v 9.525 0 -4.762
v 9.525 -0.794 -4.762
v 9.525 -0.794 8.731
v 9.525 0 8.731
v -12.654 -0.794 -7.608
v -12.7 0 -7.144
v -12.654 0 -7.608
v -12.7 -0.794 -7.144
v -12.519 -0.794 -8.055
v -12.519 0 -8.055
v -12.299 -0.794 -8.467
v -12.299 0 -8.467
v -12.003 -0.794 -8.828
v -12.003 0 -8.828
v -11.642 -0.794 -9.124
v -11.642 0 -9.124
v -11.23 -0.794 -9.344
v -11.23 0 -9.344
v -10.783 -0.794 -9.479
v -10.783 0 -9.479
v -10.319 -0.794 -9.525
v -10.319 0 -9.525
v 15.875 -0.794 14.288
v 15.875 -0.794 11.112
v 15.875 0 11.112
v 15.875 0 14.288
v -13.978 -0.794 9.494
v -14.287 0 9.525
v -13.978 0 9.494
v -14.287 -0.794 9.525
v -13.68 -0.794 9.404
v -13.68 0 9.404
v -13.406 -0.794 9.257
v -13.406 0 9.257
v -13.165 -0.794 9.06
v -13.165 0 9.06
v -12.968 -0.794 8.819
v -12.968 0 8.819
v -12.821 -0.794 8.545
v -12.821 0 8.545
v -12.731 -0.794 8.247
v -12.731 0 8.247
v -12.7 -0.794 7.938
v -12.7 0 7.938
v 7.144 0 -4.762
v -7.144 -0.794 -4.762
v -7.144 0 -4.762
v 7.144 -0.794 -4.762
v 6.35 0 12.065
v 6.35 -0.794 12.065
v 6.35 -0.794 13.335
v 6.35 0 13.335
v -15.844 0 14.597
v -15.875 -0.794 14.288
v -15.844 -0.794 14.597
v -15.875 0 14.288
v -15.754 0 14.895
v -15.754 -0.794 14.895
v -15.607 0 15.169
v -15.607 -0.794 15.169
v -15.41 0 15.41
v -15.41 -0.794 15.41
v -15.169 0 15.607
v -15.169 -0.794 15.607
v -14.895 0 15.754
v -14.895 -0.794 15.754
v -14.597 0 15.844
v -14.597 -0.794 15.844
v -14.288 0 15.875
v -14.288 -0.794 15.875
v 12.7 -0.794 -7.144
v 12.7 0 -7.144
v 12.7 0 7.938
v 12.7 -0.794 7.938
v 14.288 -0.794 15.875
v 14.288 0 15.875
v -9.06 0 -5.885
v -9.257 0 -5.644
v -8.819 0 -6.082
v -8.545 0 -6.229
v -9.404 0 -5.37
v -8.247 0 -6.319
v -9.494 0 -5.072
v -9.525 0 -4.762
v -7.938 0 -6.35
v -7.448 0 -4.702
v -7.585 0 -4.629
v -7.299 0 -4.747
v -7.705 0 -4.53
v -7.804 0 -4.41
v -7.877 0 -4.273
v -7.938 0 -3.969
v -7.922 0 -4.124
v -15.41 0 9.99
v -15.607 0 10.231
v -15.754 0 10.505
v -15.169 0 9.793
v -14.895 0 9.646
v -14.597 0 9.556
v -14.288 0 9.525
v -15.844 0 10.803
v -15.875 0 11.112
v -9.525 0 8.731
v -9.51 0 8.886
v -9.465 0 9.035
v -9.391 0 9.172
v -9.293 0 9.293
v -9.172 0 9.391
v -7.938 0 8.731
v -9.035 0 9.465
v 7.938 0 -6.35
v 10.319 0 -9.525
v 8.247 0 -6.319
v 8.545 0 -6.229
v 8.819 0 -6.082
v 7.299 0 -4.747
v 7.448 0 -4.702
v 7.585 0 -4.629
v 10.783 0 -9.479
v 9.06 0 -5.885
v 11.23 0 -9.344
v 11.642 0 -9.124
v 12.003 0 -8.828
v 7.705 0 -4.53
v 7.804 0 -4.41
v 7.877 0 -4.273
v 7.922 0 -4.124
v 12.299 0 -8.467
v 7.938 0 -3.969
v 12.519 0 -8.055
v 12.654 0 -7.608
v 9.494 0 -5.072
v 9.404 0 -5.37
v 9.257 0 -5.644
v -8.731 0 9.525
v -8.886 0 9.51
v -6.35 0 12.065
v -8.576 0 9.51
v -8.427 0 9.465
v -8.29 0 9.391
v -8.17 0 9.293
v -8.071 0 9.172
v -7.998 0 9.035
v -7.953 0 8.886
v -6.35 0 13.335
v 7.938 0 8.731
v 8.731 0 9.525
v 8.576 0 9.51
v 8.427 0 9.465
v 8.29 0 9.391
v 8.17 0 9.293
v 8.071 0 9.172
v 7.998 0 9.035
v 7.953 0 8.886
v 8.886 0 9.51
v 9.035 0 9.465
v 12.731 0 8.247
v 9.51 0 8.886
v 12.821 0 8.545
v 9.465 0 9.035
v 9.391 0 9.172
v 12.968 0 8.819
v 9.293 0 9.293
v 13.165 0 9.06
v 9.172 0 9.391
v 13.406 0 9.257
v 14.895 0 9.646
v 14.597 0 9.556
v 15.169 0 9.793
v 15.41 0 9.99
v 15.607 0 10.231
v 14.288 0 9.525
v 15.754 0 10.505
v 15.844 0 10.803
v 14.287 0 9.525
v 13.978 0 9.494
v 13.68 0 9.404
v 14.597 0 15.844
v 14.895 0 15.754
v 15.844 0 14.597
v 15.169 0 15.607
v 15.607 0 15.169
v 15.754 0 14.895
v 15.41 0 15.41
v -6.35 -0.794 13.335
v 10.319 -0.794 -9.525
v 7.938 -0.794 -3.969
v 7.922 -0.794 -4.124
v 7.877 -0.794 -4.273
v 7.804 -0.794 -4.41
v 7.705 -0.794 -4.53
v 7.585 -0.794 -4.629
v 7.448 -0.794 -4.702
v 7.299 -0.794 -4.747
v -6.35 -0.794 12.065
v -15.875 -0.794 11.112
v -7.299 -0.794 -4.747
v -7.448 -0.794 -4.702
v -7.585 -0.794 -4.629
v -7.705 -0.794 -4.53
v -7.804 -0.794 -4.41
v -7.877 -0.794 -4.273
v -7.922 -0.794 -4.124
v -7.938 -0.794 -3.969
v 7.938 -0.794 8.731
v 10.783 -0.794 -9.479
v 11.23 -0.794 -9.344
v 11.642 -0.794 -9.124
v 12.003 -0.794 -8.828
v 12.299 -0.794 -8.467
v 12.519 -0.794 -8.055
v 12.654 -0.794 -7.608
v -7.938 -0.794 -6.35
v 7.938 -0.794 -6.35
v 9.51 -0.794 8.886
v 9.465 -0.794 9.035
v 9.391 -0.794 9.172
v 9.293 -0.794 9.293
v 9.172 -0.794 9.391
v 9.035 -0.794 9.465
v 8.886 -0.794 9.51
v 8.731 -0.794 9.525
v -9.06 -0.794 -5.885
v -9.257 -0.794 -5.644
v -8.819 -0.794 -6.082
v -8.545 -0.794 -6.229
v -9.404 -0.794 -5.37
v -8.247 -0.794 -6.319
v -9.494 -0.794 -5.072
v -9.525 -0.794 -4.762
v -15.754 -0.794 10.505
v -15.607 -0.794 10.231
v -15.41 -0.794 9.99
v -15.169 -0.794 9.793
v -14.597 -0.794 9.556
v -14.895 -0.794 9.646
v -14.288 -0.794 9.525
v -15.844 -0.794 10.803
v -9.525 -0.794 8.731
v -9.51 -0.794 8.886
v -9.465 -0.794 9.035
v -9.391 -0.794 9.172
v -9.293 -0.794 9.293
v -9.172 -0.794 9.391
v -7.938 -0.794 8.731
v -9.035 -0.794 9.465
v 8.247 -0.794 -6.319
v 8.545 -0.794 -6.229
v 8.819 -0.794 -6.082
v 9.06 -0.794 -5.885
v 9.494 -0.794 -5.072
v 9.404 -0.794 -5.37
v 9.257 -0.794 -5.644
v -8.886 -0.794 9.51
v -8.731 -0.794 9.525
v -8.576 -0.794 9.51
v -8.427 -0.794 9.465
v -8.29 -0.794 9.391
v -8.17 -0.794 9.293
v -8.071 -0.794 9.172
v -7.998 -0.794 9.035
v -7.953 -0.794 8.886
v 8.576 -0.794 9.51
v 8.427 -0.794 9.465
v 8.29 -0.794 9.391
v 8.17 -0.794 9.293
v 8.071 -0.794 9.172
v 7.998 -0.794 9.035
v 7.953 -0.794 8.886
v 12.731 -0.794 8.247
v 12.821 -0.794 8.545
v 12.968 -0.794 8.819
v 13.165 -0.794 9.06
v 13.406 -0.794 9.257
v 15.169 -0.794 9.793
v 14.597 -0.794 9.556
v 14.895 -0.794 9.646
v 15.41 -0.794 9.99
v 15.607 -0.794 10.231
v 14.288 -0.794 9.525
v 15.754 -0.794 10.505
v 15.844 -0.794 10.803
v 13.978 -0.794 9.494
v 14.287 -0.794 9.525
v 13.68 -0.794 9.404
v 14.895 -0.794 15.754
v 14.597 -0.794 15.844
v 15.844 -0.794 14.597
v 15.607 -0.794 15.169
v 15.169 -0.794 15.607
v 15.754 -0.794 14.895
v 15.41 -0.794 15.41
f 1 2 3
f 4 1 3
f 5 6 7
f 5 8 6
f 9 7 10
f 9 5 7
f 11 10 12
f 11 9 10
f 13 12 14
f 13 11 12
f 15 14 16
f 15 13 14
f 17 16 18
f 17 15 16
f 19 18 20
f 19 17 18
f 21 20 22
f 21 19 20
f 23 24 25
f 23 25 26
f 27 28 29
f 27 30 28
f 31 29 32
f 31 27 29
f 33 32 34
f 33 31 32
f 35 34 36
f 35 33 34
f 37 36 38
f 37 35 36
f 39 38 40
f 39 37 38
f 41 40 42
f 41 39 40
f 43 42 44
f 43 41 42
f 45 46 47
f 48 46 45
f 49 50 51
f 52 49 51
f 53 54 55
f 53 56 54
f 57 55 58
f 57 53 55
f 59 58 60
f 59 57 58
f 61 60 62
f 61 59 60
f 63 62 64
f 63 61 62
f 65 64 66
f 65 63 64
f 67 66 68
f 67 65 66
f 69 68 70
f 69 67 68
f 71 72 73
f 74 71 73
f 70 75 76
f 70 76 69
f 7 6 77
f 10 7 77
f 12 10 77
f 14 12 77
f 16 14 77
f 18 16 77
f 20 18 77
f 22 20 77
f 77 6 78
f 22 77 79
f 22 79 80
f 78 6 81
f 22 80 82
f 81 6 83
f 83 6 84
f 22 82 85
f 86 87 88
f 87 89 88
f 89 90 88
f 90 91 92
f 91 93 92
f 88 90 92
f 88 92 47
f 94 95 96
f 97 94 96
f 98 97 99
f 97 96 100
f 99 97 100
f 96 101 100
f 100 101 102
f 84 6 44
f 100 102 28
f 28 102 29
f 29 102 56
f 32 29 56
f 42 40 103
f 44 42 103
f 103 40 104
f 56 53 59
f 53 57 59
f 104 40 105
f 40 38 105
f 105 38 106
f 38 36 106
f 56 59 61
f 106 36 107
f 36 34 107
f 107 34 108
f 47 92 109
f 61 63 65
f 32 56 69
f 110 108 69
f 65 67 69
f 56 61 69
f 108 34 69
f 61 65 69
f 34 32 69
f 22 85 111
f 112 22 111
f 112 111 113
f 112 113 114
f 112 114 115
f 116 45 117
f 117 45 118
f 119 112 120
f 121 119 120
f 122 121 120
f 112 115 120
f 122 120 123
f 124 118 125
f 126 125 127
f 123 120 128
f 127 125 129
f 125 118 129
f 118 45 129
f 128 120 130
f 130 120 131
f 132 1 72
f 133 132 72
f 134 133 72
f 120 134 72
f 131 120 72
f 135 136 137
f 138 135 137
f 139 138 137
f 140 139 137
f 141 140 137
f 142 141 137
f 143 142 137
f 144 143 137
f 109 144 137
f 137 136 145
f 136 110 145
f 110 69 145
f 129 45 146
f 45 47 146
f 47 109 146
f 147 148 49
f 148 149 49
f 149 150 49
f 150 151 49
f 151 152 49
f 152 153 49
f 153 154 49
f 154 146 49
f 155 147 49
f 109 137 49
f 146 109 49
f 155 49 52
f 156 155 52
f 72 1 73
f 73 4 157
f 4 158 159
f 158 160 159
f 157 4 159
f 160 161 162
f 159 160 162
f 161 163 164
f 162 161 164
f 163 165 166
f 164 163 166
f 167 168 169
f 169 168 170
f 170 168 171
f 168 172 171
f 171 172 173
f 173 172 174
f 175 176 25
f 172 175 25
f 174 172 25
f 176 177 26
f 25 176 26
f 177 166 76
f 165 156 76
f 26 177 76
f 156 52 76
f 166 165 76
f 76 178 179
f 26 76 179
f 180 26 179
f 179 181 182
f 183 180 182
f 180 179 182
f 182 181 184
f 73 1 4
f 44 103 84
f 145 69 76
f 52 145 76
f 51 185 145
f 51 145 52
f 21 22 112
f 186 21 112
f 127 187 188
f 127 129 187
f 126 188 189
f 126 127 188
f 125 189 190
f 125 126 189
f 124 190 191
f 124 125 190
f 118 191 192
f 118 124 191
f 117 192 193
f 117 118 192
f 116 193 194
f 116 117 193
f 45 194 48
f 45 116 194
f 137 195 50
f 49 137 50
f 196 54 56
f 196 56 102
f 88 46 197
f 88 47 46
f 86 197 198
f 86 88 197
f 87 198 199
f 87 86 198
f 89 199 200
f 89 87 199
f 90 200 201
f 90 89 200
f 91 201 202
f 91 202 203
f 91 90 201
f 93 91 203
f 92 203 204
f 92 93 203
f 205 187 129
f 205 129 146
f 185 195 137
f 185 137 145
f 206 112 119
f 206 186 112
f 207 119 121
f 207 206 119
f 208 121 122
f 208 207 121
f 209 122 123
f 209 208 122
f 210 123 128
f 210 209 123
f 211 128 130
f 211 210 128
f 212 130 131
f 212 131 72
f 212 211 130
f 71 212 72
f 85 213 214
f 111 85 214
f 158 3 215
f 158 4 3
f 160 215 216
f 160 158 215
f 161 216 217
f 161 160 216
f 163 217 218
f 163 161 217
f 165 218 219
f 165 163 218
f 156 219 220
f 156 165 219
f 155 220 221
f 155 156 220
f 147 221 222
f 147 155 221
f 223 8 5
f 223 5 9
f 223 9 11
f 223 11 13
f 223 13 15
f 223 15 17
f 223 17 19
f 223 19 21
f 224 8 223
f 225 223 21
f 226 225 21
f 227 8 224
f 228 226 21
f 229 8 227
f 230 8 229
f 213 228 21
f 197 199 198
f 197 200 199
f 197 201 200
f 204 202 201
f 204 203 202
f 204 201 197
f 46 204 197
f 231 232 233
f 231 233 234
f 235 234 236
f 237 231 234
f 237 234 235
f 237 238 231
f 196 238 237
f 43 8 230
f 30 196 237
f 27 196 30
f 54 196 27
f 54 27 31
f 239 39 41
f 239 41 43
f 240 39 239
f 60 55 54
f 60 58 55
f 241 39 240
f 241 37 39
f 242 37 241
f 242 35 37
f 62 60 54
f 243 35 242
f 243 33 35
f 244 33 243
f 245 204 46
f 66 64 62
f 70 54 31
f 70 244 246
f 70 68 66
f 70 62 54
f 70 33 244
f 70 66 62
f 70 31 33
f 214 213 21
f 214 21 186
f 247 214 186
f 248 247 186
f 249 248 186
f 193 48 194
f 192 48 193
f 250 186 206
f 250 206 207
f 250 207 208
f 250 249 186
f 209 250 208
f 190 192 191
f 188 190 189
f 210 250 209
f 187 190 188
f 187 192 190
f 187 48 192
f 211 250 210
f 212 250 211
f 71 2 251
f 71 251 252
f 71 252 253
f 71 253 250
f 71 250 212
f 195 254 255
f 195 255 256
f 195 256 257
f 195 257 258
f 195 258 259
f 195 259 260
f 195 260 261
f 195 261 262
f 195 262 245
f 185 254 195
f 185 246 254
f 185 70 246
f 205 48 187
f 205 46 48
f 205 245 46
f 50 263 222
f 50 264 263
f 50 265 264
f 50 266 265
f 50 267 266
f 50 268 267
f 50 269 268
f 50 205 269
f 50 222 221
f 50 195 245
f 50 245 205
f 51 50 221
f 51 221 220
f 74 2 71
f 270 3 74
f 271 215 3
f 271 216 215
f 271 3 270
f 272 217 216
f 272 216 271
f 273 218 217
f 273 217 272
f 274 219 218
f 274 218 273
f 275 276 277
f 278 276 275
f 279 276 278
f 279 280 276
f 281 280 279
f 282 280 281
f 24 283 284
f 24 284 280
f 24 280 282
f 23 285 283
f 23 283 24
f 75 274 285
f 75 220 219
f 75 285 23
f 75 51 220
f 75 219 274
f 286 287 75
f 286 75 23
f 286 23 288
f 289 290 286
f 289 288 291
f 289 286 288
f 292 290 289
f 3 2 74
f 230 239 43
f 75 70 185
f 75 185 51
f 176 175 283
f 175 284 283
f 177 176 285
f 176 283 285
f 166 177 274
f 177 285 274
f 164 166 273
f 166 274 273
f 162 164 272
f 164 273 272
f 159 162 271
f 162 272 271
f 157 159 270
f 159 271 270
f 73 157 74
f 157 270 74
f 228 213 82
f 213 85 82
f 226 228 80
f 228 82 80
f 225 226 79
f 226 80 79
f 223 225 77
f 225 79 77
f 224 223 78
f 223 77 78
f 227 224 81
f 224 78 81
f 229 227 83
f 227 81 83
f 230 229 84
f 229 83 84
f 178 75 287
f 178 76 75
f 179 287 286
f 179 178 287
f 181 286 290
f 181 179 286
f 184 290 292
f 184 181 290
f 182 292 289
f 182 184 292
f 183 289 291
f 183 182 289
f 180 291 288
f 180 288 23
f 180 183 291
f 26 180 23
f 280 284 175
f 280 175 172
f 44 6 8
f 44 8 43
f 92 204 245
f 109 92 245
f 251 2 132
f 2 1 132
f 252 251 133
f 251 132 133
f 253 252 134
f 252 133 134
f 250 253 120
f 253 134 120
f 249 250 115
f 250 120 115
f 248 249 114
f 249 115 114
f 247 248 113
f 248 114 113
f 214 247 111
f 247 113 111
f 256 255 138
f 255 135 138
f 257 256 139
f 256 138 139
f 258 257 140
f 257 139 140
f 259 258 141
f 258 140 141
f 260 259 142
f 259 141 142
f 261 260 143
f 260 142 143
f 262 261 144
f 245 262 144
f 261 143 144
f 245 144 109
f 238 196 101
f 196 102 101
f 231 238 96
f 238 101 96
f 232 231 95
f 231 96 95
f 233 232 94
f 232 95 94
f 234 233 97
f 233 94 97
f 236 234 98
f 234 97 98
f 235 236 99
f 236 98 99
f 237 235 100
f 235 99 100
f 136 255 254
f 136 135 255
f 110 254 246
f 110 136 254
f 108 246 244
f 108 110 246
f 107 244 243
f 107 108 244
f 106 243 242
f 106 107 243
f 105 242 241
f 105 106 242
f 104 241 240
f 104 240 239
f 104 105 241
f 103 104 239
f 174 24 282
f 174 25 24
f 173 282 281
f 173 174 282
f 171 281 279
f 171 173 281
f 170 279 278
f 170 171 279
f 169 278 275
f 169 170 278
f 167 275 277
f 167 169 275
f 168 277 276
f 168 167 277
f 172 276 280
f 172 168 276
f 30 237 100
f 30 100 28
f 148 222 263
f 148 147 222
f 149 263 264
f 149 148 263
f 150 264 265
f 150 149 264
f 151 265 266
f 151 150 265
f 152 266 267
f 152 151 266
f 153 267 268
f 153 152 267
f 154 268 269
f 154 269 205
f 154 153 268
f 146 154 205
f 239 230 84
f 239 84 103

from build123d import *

# Parameters (mm, degrees)
F0_W      = 25.4
F0_H      = 19.05
F1_DEPTH  = 0.79375
F2_R      = 2.38125
F3_W      = 19.05
F3_H      = 15.875
F4_DEPTH  = 4.9276
F5_W      = 12.7
F5_H      = 1.27
F6_DEPTH  = 0.79375
F7_R      = 1.58749
F8_R      = 1.5875
F9_W      = 12.7
F9_H      = 1.27
F9_W_2    = 15.875
F9_H_2    = 14.2875
F10_DEPTH = 0.79375
F11_R     = 0.79374
F12_R     = 0.79375


# Not quite as in the source:
# - a fillet or chamfer is up to 0.001 mm smaller than in the source, because OpenCascade refuses the exact size
# - ends of sketch curves that miss each other by under 0.0002 mm in the source are joined


with BuildPart() as f1:
    # F0 (on Front) → F1 (new body)
    with BuildSketch(Plane.XZ):
        Rectangle(F0_W, F0_H)
    extrude(amount=F1_DEPTH)

    # F2
    f2_edges = [f1.edges().sort_by_distance(p)[0] for p in [
        (12.7, -0.396875, -9.525),
        (-12.7, -0.396875, -9.525),
    ]]
    fillet(f2_edges, radius=F2_R)

    # F3 (on face) → F4 (cut)
    with BuildSketch(Plane.XZ.offset(0.79375)):
        with Locations((0, 1.5875)):
            Rectangle(F3_W, F3_H)
    extrude(amount=-F4_DEPTH, mode=Mode.SUBTRACT)

    # F5 (on face) → F6 (join)
    with BuildSketch(Plane.XZ.offset(0.79375)):
        Polygon((-15.875, 15.875), (-15.875, 9.525), (-12.7, 9.525), (-9.525, 9.525), (9.525, 9.525), (12.7, 9.525), (15.875, 9.525), (15.875, 15.875), align=None)
        with Locations((0, 12.7)):
            Rectangle(F5_W, F5_H, mode=Mode.SUBTRACT)
    extrude(amount=-F6_DEPTH)

    # F7 (radius 1.5875 in the source; OpenCascade refuses exactly that, so slightly less here)
    f7_edges = [f1.edges().sort_by_distance(p)[0] for p in [
        (-15.875, -0.396875, 15.875),
        (15.875, -0.396875, 15.875),
        (15.875, -0.396875, 9.525),
        (12.7, -0.396875, 9.525),
        (-15.875, -0.396875, 9.525),
        (-12.7, -0.396875, 9.525),
    ]]
    fillet(f7_edges, radius=F7_R)

    # F8
    f8_edges = [f1.edges().sort_by_distance(p)[0] for p in [
        (-9.525, -0.396875, -6.35),
        (9.525, -0.396875, -6.35),
    ]]
    fillet(f8_edges, radius=F8_R)

    # F9 (on face) → F10 (join)
    with BuildSketch(Plane.XZ.offset(0.79375)):
        with BuildLine():
            ThreePointArc((-14.28751, 15.875), (-15.4100349441, 15.4100349441), (-15.875, 14.28751))
            Line((-15.875, 14.28751), (-15.875, 11.11249))
            ThreePointArc((-15.875, 11.11249), (-15.4100349441, 9.9899650559), (-14.28751, 9.525))
            ThreePointArc((-14.28751, 9.525), (-13.1649650559, 9.0600349441), (-12.7, 7.93751))
            Line((-12.7, 7.93751), (-12.7, -7.14375))
            ThreePointArc((-12.7, -7.14375), (-12.0025480227, -8.8275480227), (-10.31875, -9.525))
            Line((-10.31875, -9.525), (10.31875, -9.525))
            ThreePointArc((10.31875, -9.525), (12.0025480227, -8.8275480227), (12.7, -7.14375))
            Line((12.7, -7.14375), (12.7, 7.93751))
            ThreePointArc((12.7, 7.93751), (13.1649650559, 9.0600349441), (14.28749, 9.525))
            ThreePointArc((14.28749, 9.525), (15.4100349441, 9.9899650559), (15.875, 11.11249))
            Line((15.875, 11.11249), (15.875, 14.28751))
            ThreePointArc((15.875, 14.28751), (15.4100349441, 15.4100349441), (14.28751, 15.875))
            Line((14.28751, 15.875), (-14.28751, 15.875))
        make_face()
        with BuildLine():
            Line((-9.525, 9.525), (-7.9375, 9.525))
            Line((-7.9375, 9.525), (7.9375, 9.525))
            Line((7.9375, 9.525), (9.525, 9.525))
            Line((9.525, 9.525), (9.525, -4.7625))
            ThreePointArc((9.525, -4.7625), (9.0600320151, -5.8850320151), (7.9375, -6.35))
            Line((7.9375, -6.35), (-7.9375, -6.35))
            ThreePointArc((-7.9375, -6.35), (-9.0600320151, -5.8850320151), (-9.525, -4.7625))
            Line((-9.525, -4.7625), (-9.525, 9.525))
        make_face(mode=Mode.SUBTRACT)
        with Locations((0, 12.7)):
            Rectangle(F9_W, F9_H, mode=Mode.SUBTRACT)
        with Locations((0, 2.38125)):
            Rectangle(F9_W_2, F9_H_2)
    extrude(amount=-F10_DEPTH)

    # F11 (radius 0.79375 in the source; OpenCascade refuses exactly that, so slightly less here)
    f11_edges = [f1.edges().sort_by_distance(p)[0] for p in [
        (-7.9375, -0.396875, 9.525),
        (-9.525, -0.396875, 9.525),
        (7.9375, -0.396875, 9.525),
        (9.525, -0.396875, 9.525),
    ]]
    fillet(f11_edges, radius=F11_R)

    # F12
    f12_edges = [f1.edges().sort_by_distance(p)[0] for p in [
        (-7.9375, -0.396875, -4.7625),
        (7.9375, -0.396875, -4.7625),
    ]]
    fillet(f12_edges, radius=F12_R)


solid = f1.part
